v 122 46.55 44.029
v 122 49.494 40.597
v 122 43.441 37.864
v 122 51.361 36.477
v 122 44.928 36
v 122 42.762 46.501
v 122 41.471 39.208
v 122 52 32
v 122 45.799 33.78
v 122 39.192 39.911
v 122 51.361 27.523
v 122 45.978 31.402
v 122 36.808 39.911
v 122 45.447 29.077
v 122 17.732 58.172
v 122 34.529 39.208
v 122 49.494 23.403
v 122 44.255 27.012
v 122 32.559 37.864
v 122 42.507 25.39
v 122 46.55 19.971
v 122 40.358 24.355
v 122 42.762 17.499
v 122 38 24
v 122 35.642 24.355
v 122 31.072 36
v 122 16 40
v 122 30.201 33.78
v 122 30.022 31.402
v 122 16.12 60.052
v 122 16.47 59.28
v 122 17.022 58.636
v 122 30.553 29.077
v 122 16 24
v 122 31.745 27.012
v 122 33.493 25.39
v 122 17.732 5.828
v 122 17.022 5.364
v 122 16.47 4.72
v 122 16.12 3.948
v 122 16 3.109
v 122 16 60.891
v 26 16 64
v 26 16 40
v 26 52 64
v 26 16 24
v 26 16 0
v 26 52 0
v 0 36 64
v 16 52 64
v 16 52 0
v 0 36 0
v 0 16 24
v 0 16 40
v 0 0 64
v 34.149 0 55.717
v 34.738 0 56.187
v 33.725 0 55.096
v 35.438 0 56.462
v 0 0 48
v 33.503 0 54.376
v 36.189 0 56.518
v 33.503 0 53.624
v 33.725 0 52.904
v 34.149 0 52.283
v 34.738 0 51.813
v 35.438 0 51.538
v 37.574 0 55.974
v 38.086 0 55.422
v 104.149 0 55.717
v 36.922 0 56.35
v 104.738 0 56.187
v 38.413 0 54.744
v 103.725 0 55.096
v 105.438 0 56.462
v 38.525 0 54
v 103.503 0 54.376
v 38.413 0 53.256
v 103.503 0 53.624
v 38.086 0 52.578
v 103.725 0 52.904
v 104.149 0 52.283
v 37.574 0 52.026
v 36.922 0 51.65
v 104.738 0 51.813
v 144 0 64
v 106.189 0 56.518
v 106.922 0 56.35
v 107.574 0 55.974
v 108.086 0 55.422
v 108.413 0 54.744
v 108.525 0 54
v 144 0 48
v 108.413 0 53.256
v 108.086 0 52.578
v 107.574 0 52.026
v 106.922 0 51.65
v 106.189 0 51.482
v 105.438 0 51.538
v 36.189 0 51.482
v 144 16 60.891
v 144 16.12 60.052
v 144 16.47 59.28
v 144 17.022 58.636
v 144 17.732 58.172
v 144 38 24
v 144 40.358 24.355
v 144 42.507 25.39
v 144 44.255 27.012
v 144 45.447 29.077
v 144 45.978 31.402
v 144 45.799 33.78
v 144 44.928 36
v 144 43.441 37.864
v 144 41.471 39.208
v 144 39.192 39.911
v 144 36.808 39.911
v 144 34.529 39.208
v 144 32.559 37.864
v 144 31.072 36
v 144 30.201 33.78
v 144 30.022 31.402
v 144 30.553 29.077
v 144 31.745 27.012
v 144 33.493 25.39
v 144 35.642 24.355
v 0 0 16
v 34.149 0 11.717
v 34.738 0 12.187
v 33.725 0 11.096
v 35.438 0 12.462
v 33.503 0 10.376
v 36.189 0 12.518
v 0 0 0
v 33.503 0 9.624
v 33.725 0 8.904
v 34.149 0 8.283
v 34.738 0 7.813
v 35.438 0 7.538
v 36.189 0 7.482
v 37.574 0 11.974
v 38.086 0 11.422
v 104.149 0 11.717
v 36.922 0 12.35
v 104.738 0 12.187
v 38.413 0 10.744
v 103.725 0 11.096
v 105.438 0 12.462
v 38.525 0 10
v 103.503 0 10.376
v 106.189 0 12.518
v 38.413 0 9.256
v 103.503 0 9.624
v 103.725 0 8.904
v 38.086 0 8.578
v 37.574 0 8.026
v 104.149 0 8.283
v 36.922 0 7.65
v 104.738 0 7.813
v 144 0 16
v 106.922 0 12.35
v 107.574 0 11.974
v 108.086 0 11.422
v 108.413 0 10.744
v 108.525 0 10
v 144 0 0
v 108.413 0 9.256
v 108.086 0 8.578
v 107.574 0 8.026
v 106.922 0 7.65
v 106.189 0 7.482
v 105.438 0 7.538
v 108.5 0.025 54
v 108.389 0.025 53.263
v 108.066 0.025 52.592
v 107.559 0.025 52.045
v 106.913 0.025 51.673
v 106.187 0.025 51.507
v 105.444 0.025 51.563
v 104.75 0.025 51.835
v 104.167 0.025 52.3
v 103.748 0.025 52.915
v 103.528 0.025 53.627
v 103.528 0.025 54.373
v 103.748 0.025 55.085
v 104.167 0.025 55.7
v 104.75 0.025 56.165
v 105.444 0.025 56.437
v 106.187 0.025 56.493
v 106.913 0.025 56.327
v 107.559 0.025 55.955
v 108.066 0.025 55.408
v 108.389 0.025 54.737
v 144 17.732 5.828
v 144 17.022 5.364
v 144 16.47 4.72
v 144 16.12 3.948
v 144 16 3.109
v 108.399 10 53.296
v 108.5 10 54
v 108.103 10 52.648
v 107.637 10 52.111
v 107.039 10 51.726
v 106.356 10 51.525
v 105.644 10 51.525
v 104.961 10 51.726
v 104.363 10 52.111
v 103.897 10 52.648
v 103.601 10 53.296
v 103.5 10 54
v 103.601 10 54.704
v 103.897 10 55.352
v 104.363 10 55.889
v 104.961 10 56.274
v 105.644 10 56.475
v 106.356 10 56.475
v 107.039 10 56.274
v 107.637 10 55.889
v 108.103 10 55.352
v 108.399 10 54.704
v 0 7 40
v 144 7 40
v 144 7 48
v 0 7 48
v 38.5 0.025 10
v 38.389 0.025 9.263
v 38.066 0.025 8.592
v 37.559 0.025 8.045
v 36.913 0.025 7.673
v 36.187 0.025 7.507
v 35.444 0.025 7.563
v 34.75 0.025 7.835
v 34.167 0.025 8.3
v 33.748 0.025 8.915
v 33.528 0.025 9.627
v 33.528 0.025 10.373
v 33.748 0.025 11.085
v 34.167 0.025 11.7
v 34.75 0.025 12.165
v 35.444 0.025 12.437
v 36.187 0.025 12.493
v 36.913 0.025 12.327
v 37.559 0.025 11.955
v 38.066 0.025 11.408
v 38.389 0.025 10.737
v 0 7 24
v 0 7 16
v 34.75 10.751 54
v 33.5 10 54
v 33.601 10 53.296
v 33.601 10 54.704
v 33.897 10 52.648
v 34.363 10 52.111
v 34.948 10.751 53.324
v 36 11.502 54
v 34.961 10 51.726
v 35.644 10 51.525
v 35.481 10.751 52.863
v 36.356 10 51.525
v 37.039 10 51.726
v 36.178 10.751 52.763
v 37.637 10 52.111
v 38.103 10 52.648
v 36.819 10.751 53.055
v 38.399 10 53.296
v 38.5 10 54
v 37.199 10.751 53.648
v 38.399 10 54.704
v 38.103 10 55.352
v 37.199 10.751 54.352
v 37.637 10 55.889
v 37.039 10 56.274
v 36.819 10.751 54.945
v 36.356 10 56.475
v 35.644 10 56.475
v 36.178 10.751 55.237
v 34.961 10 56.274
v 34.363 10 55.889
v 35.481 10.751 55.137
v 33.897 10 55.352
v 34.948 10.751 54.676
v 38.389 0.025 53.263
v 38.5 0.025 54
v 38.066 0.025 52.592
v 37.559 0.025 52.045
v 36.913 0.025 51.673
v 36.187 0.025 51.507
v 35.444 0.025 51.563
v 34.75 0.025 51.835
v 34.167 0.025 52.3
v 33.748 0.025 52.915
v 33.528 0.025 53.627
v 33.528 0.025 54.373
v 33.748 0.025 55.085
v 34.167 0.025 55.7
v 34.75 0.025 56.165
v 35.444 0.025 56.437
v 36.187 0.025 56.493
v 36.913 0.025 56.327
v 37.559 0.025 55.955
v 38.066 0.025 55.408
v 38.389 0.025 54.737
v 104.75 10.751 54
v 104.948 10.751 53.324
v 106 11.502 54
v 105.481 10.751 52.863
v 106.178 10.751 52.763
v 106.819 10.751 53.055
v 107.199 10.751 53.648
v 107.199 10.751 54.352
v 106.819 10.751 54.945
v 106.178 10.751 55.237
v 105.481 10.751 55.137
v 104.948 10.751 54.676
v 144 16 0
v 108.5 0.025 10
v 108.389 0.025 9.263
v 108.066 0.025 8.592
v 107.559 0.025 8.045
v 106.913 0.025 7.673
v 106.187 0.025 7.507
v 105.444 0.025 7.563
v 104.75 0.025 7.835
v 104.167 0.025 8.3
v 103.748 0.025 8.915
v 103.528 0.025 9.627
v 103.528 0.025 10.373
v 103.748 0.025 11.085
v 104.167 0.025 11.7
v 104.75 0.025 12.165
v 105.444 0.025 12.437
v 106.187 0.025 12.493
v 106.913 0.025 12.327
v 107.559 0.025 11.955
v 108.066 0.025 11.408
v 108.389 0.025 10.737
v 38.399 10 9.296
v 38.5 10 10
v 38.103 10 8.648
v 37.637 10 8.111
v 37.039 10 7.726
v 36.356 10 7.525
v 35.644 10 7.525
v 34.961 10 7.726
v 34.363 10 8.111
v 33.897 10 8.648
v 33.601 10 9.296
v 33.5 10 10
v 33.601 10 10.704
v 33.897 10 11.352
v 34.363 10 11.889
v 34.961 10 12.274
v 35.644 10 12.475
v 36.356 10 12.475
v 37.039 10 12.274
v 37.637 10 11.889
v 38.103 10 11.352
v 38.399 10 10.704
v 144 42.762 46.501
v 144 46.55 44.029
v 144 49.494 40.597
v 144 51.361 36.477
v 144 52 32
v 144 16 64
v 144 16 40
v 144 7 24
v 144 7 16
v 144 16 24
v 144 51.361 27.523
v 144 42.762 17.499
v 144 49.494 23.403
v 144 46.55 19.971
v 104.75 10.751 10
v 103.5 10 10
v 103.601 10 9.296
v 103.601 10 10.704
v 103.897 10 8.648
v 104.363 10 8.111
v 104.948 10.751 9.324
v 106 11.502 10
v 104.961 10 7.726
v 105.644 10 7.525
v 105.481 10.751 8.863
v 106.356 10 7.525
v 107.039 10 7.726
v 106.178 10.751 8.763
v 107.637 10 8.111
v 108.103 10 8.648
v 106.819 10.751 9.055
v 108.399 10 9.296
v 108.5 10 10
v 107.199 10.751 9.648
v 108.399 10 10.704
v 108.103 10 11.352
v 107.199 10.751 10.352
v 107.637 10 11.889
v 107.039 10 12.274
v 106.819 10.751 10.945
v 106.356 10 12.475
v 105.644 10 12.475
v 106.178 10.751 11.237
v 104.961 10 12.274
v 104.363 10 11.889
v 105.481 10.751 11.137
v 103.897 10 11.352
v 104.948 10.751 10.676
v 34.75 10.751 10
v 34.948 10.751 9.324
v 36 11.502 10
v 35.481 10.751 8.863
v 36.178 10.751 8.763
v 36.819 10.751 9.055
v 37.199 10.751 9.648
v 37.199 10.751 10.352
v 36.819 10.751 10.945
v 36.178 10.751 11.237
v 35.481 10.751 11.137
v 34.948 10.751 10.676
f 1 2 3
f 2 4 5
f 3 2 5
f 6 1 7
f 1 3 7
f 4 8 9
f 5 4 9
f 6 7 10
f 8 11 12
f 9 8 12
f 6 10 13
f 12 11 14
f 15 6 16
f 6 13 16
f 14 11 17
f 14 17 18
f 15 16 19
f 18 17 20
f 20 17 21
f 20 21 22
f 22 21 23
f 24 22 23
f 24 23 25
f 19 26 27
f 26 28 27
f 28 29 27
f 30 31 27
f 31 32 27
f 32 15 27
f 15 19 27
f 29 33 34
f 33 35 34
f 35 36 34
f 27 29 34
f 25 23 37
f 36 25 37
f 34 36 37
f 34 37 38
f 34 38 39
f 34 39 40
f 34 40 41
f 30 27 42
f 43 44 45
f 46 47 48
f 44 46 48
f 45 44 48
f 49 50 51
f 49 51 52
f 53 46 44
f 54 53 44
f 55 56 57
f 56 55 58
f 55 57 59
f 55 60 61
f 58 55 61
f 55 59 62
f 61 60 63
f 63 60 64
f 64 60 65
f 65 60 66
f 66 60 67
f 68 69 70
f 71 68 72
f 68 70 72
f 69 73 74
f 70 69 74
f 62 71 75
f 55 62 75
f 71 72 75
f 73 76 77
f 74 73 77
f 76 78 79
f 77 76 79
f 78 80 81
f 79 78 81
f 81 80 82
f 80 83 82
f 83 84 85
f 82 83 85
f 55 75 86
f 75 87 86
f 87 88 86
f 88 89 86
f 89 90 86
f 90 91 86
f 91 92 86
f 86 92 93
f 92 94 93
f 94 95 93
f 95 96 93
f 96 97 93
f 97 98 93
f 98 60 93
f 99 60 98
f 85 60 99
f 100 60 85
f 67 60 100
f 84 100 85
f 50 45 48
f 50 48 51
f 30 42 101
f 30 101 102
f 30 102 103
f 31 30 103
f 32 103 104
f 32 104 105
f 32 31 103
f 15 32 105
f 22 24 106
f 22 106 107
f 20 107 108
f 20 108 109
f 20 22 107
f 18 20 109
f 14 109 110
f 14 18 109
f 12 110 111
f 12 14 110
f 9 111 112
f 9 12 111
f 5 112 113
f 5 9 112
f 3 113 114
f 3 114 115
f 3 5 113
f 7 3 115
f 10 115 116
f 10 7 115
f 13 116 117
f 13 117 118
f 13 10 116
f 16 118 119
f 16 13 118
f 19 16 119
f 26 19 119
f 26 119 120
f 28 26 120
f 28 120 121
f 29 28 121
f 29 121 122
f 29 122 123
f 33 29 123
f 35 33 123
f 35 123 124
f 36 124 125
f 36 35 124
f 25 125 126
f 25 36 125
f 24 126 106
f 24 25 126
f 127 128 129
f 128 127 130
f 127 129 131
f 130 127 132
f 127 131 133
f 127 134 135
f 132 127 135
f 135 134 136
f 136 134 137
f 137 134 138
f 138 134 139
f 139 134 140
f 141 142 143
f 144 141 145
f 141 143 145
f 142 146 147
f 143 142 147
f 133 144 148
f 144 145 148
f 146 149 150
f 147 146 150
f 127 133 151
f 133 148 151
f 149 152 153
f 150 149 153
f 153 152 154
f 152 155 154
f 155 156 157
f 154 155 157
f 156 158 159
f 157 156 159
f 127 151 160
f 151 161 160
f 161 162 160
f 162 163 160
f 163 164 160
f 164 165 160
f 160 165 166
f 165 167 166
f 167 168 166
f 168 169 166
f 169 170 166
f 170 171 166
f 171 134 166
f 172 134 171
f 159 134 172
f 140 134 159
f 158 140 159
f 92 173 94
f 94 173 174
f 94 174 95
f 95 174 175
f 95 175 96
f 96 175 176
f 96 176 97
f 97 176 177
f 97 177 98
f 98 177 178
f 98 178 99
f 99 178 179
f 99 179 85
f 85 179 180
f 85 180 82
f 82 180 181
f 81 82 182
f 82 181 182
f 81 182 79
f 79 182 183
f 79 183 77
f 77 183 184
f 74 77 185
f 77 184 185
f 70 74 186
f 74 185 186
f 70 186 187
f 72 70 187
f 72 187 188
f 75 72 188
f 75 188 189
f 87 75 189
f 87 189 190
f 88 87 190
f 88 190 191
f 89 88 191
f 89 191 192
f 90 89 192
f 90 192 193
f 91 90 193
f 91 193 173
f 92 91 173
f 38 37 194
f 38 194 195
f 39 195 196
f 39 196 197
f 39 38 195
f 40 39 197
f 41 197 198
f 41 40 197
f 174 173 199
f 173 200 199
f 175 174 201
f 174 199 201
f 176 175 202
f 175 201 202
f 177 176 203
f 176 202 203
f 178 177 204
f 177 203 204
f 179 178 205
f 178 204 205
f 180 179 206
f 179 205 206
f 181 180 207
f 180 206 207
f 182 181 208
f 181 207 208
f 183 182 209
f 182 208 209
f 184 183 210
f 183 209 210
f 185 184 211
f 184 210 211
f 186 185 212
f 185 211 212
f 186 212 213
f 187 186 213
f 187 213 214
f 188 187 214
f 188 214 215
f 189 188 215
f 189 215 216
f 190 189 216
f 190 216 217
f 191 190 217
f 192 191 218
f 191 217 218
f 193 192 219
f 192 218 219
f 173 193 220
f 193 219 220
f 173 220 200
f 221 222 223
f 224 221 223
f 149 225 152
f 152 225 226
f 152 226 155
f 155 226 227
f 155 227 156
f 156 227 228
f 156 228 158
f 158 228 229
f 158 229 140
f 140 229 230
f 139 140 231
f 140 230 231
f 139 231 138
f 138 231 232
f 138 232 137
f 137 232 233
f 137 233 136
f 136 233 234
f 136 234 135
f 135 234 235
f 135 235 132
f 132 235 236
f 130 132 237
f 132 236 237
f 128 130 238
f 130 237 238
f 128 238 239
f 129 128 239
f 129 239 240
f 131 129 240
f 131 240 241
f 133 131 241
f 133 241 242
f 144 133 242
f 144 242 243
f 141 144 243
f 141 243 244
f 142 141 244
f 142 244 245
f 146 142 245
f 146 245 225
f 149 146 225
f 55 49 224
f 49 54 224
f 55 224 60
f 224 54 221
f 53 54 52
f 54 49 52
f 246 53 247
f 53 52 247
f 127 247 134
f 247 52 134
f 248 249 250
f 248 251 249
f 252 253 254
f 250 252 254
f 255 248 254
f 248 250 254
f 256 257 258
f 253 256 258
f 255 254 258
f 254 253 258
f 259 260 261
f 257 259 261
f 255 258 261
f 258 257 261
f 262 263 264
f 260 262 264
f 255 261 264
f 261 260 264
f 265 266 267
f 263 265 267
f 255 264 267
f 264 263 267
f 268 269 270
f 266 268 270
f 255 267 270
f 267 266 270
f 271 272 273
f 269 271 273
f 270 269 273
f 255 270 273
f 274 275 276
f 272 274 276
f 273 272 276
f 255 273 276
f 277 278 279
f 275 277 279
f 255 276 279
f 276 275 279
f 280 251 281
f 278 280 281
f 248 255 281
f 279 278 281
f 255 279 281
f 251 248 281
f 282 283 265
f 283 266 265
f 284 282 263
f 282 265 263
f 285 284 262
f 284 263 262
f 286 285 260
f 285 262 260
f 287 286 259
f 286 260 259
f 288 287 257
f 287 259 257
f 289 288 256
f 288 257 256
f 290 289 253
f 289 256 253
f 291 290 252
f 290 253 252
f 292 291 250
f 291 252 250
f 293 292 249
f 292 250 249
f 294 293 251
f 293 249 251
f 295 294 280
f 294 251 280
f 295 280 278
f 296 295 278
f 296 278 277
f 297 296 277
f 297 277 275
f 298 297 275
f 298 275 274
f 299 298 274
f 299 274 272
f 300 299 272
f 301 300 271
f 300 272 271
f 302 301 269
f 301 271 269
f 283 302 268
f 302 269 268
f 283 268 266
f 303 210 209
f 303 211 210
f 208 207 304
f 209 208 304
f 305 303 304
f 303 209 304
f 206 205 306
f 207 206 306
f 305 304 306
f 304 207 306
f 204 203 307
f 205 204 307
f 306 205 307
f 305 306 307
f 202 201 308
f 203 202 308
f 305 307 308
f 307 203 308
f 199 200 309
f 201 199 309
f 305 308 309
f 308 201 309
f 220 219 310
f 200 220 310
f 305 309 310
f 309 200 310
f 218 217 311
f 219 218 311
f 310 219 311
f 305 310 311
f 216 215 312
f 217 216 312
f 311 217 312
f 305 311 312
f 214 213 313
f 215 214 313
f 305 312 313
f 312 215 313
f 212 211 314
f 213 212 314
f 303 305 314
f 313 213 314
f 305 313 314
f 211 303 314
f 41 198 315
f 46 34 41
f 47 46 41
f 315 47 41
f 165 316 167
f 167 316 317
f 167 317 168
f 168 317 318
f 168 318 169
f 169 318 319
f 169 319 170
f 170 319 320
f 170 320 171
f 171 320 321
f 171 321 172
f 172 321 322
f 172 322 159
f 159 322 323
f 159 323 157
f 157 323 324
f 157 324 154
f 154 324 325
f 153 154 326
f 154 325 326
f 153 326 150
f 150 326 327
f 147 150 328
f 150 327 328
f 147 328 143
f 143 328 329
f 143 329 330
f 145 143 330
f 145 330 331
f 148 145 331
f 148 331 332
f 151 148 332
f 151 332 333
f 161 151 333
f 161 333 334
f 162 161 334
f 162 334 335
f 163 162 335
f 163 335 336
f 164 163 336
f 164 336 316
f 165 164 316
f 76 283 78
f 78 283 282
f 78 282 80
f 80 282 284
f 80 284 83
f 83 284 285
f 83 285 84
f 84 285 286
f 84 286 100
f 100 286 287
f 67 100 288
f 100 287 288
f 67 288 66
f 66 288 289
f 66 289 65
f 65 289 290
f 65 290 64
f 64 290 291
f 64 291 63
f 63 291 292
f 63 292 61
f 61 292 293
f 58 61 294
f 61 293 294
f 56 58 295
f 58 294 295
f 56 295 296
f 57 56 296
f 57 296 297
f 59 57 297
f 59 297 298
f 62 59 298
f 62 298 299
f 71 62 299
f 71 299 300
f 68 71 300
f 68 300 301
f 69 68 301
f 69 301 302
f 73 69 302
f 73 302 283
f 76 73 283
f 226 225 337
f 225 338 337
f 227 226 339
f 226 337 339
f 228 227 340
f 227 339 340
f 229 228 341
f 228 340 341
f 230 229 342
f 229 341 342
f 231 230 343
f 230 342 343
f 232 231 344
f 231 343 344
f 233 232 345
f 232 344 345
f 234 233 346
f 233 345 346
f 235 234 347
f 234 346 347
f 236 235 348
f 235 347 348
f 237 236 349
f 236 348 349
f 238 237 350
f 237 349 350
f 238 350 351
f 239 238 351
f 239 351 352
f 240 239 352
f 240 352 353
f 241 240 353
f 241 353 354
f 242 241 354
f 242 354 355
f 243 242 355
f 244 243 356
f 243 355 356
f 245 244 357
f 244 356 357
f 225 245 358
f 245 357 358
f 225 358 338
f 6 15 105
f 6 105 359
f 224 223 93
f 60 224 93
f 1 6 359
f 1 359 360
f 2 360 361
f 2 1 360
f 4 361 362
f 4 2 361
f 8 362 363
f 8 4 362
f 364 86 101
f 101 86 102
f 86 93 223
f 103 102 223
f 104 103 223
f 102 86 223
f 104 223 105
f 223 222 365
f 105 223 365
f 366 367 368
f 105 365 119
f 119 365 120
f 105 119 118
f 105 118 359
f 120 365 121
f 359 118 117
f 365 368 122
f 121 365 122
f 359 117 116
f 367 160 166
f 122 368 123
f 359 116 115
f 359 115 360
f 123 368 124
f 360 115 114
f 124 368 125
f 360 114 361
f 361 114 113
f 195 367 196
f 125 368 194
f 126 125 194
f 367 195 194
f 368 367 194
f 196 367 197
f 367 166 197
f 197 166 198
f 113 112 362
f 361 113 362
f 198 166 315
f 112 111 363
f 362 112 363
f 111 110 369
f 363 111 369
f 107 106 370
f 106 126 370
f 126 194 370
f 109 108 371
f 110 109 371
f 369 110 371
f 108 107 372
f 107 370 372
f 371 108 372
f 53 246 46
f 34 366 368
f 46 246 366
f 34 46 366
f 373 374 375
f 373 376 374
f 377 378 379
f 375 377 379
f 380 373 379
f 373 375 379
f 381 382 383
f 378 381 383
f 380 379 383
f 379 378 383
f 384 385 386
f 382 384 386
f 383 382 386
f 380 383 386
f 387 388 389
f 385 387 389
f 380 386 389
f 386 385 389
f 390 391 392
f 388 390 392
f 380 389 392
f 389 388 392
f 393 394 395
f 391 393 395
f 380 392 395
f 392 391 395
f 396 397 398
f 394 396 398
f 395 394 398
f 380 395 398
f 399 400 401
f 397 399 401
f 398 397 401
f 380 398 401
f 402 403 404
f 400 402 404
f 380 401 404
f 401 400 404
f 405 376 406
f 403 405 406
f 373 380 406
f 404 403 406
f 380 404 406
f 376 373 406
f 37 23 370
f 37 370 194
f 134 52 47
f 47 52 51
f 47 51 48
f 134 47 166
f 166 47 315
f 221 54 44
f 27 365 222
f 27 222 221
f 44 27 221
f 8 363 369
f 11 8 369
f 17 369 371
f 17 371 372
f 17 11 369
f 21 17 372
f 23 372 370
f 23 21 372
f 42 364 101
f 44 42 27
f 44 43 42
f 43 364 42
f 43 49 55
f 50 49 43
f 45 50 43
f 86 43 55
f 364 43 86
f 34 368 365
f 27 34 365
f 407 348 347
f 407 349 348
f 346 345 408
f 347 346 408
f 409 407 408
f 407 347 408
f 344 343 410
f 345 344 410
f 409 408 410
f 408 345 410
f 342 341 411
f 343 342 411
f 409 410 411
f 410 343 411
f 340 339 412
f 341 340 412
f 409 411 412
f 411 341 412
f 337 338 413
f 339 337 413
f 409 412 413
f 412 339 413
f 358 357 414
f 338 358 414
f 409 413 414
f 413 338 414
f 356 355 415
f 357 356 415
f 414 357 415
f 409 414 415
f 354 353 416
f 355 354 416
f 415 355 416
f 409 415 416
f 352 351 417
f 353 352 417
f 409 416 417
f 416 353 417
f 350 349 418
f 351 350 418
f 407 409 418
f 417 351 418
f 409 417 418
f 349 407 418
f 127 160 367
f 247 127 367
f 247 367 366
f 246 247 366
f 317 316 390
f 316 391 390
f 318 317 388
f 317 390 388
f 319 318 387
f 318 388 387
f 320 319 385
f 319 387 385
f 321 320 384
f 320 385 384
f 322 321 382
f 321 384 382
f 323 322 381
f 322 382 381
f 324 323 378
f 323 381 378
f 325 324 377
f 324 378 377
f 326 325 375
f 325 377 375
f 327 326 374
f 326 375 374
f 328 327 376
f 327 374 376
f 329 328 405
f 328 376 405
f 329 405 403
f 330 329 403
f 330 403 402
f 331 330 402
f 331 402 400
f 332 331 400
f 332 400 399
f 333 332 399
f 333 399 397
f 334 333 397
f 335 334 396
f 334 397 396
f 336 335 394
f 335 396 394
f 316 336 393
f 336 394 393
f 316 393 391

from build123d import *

# Parameters (mm, degrees)
BOSS_EXTRUDE1_DEPTH                   = 64
SKETCH4_R                             = 8
CUT_EXTRUDE1_DEPTH                    = 22
CUT_EXTRUDE2_DEPTH                    = 166.939748102
TAP_DRILL_FOR_M6X1_0_TAP2_D           = 5
TAP_DRILL_FOR_M6X1_0_TAP2_DEPTH       = 10
TAP_DRILL_FOR_M6X1_0_TAP2_CSINK_D     = 5.05
TAP_DRILL_FOR_M6X1_0_TAP2_CSINK_ANGLE = 90
TAP_DRILL_FOR_M6X1_0_TAP2_TIP         = 1.502151548


with BuildPart() as part:
    # Sketch1 → Boss-Extrude1 (new body)
    with BuildSketch(Plane.XY):
        Polygon((0, 0), (144, 0), (144, 16), (144, 52), (122, 52), (122, 16), (26, 16), (26, 52), (16, 52), (0, 36), (0, 16), align=None)
    extrude(amount=BOSS_EXTRUDE1_DEPTH)

    # Sketch4 → Cut-Extrude1 (cut)
    with BuildSketch(Plane(origin=(144, 0, 0), x_dir=(0, 0, -1), z_dir=(1, 0, 0))):
        with BuildLine():
            Line((0, 52), (-32.000000005, 52))
            ThreePointArc((-32.000000005, 52), (-23.403206269, 49.494263134), (-17.499075407, 42.761892188))
            Line((-17.499075407, 42.761892188), (-5.827512712, 17.732145215))
            ThreePointArc((-5.827512712, 17.732145215), (-4.720488176, 16.469825663), (-3.108589351, 16))
            Line((-3.108589351, 16), (0, 16))
            Line((0, 16), (0, 52))
        make_face()
        with BuildLine():
            Line((-58.172487288, 17.732145215), (-46.500924593, 42.761892188))
            ThreePointArc((-46.500924593, 42.761892188), (-40.596793736, 49.494263132), (-32.000000005, 52))
            Line((-32.000000005, 52), (-64, 52))
            Line((-64, 52), (-64, 16))
            Line((-64, 16), (-60.891410649, 16))
            ThreePointArc((-60.891410649, 16), (-59.279511824, 16.469825663), (-58.172487288, 17.732145215))
        make_face()
        with Locations((-32, 38)):
            Circle(SKETCH4_R)
    extrude(amount=-CUT_EXTRUDE1_DEPTH, mode=Mode.SUBTRACT)

    # Sketch4<3> → Cut-Extrude2 (cut, through all)
    with BuildSketch(Plane(origin=(144, 0, 0), x_dir=(0, 0, -1), z_dir=(1, 0, 0))):
        Polygon((-24, 16), (-40, 16), (-40, 7), (-48, 7), (-48, 0), (-16, 0), (-16, 7), (-24, 7), align=None)
    extrude(amount=-CUT_EXTRUDE2_DEPTH, mode=Mode.SUBTRACT)

    # Tap Drill for M6x1.0 Tap2
    with Locations(Plane(origin=(0, 0, 0), x_dir=(-1, 0, 0), z_dir=(0, -1, 0))):
        with Locations((-36, -54), (-106, -54), (-106, -10), (-36, -10)):
            CounterSinkHole(TAP_DRILL_FOR_M6X1_0_TAP2_D / 2, TAP_DRILL_FOR_M6X1_0_TAP2_CSINK_D / 2, depth=TAP_DRILL_FOR_M6X1_0_TAP2_DEPTH, counter_sink_angle=TAP_DRILL_FOR_M6X1_0_TAP2_CSINK_ANGLE)
            with Locations((0, 0, -(TAP_DRILL_FOR_M6X1_0_TAP2_DEPTH + TAP_DRILL_FOR_M6X1_0_TAP2_TIP / 2))):  # 118° drill point
                Cone(0, TAP_DRILL_FOR_M6X1_0_TAP2_D / 2, TAP_DRILL_FOR_M6X1_0_TAP2_TIP, mode=Mode.SUBTRACT)


solid = part.part
